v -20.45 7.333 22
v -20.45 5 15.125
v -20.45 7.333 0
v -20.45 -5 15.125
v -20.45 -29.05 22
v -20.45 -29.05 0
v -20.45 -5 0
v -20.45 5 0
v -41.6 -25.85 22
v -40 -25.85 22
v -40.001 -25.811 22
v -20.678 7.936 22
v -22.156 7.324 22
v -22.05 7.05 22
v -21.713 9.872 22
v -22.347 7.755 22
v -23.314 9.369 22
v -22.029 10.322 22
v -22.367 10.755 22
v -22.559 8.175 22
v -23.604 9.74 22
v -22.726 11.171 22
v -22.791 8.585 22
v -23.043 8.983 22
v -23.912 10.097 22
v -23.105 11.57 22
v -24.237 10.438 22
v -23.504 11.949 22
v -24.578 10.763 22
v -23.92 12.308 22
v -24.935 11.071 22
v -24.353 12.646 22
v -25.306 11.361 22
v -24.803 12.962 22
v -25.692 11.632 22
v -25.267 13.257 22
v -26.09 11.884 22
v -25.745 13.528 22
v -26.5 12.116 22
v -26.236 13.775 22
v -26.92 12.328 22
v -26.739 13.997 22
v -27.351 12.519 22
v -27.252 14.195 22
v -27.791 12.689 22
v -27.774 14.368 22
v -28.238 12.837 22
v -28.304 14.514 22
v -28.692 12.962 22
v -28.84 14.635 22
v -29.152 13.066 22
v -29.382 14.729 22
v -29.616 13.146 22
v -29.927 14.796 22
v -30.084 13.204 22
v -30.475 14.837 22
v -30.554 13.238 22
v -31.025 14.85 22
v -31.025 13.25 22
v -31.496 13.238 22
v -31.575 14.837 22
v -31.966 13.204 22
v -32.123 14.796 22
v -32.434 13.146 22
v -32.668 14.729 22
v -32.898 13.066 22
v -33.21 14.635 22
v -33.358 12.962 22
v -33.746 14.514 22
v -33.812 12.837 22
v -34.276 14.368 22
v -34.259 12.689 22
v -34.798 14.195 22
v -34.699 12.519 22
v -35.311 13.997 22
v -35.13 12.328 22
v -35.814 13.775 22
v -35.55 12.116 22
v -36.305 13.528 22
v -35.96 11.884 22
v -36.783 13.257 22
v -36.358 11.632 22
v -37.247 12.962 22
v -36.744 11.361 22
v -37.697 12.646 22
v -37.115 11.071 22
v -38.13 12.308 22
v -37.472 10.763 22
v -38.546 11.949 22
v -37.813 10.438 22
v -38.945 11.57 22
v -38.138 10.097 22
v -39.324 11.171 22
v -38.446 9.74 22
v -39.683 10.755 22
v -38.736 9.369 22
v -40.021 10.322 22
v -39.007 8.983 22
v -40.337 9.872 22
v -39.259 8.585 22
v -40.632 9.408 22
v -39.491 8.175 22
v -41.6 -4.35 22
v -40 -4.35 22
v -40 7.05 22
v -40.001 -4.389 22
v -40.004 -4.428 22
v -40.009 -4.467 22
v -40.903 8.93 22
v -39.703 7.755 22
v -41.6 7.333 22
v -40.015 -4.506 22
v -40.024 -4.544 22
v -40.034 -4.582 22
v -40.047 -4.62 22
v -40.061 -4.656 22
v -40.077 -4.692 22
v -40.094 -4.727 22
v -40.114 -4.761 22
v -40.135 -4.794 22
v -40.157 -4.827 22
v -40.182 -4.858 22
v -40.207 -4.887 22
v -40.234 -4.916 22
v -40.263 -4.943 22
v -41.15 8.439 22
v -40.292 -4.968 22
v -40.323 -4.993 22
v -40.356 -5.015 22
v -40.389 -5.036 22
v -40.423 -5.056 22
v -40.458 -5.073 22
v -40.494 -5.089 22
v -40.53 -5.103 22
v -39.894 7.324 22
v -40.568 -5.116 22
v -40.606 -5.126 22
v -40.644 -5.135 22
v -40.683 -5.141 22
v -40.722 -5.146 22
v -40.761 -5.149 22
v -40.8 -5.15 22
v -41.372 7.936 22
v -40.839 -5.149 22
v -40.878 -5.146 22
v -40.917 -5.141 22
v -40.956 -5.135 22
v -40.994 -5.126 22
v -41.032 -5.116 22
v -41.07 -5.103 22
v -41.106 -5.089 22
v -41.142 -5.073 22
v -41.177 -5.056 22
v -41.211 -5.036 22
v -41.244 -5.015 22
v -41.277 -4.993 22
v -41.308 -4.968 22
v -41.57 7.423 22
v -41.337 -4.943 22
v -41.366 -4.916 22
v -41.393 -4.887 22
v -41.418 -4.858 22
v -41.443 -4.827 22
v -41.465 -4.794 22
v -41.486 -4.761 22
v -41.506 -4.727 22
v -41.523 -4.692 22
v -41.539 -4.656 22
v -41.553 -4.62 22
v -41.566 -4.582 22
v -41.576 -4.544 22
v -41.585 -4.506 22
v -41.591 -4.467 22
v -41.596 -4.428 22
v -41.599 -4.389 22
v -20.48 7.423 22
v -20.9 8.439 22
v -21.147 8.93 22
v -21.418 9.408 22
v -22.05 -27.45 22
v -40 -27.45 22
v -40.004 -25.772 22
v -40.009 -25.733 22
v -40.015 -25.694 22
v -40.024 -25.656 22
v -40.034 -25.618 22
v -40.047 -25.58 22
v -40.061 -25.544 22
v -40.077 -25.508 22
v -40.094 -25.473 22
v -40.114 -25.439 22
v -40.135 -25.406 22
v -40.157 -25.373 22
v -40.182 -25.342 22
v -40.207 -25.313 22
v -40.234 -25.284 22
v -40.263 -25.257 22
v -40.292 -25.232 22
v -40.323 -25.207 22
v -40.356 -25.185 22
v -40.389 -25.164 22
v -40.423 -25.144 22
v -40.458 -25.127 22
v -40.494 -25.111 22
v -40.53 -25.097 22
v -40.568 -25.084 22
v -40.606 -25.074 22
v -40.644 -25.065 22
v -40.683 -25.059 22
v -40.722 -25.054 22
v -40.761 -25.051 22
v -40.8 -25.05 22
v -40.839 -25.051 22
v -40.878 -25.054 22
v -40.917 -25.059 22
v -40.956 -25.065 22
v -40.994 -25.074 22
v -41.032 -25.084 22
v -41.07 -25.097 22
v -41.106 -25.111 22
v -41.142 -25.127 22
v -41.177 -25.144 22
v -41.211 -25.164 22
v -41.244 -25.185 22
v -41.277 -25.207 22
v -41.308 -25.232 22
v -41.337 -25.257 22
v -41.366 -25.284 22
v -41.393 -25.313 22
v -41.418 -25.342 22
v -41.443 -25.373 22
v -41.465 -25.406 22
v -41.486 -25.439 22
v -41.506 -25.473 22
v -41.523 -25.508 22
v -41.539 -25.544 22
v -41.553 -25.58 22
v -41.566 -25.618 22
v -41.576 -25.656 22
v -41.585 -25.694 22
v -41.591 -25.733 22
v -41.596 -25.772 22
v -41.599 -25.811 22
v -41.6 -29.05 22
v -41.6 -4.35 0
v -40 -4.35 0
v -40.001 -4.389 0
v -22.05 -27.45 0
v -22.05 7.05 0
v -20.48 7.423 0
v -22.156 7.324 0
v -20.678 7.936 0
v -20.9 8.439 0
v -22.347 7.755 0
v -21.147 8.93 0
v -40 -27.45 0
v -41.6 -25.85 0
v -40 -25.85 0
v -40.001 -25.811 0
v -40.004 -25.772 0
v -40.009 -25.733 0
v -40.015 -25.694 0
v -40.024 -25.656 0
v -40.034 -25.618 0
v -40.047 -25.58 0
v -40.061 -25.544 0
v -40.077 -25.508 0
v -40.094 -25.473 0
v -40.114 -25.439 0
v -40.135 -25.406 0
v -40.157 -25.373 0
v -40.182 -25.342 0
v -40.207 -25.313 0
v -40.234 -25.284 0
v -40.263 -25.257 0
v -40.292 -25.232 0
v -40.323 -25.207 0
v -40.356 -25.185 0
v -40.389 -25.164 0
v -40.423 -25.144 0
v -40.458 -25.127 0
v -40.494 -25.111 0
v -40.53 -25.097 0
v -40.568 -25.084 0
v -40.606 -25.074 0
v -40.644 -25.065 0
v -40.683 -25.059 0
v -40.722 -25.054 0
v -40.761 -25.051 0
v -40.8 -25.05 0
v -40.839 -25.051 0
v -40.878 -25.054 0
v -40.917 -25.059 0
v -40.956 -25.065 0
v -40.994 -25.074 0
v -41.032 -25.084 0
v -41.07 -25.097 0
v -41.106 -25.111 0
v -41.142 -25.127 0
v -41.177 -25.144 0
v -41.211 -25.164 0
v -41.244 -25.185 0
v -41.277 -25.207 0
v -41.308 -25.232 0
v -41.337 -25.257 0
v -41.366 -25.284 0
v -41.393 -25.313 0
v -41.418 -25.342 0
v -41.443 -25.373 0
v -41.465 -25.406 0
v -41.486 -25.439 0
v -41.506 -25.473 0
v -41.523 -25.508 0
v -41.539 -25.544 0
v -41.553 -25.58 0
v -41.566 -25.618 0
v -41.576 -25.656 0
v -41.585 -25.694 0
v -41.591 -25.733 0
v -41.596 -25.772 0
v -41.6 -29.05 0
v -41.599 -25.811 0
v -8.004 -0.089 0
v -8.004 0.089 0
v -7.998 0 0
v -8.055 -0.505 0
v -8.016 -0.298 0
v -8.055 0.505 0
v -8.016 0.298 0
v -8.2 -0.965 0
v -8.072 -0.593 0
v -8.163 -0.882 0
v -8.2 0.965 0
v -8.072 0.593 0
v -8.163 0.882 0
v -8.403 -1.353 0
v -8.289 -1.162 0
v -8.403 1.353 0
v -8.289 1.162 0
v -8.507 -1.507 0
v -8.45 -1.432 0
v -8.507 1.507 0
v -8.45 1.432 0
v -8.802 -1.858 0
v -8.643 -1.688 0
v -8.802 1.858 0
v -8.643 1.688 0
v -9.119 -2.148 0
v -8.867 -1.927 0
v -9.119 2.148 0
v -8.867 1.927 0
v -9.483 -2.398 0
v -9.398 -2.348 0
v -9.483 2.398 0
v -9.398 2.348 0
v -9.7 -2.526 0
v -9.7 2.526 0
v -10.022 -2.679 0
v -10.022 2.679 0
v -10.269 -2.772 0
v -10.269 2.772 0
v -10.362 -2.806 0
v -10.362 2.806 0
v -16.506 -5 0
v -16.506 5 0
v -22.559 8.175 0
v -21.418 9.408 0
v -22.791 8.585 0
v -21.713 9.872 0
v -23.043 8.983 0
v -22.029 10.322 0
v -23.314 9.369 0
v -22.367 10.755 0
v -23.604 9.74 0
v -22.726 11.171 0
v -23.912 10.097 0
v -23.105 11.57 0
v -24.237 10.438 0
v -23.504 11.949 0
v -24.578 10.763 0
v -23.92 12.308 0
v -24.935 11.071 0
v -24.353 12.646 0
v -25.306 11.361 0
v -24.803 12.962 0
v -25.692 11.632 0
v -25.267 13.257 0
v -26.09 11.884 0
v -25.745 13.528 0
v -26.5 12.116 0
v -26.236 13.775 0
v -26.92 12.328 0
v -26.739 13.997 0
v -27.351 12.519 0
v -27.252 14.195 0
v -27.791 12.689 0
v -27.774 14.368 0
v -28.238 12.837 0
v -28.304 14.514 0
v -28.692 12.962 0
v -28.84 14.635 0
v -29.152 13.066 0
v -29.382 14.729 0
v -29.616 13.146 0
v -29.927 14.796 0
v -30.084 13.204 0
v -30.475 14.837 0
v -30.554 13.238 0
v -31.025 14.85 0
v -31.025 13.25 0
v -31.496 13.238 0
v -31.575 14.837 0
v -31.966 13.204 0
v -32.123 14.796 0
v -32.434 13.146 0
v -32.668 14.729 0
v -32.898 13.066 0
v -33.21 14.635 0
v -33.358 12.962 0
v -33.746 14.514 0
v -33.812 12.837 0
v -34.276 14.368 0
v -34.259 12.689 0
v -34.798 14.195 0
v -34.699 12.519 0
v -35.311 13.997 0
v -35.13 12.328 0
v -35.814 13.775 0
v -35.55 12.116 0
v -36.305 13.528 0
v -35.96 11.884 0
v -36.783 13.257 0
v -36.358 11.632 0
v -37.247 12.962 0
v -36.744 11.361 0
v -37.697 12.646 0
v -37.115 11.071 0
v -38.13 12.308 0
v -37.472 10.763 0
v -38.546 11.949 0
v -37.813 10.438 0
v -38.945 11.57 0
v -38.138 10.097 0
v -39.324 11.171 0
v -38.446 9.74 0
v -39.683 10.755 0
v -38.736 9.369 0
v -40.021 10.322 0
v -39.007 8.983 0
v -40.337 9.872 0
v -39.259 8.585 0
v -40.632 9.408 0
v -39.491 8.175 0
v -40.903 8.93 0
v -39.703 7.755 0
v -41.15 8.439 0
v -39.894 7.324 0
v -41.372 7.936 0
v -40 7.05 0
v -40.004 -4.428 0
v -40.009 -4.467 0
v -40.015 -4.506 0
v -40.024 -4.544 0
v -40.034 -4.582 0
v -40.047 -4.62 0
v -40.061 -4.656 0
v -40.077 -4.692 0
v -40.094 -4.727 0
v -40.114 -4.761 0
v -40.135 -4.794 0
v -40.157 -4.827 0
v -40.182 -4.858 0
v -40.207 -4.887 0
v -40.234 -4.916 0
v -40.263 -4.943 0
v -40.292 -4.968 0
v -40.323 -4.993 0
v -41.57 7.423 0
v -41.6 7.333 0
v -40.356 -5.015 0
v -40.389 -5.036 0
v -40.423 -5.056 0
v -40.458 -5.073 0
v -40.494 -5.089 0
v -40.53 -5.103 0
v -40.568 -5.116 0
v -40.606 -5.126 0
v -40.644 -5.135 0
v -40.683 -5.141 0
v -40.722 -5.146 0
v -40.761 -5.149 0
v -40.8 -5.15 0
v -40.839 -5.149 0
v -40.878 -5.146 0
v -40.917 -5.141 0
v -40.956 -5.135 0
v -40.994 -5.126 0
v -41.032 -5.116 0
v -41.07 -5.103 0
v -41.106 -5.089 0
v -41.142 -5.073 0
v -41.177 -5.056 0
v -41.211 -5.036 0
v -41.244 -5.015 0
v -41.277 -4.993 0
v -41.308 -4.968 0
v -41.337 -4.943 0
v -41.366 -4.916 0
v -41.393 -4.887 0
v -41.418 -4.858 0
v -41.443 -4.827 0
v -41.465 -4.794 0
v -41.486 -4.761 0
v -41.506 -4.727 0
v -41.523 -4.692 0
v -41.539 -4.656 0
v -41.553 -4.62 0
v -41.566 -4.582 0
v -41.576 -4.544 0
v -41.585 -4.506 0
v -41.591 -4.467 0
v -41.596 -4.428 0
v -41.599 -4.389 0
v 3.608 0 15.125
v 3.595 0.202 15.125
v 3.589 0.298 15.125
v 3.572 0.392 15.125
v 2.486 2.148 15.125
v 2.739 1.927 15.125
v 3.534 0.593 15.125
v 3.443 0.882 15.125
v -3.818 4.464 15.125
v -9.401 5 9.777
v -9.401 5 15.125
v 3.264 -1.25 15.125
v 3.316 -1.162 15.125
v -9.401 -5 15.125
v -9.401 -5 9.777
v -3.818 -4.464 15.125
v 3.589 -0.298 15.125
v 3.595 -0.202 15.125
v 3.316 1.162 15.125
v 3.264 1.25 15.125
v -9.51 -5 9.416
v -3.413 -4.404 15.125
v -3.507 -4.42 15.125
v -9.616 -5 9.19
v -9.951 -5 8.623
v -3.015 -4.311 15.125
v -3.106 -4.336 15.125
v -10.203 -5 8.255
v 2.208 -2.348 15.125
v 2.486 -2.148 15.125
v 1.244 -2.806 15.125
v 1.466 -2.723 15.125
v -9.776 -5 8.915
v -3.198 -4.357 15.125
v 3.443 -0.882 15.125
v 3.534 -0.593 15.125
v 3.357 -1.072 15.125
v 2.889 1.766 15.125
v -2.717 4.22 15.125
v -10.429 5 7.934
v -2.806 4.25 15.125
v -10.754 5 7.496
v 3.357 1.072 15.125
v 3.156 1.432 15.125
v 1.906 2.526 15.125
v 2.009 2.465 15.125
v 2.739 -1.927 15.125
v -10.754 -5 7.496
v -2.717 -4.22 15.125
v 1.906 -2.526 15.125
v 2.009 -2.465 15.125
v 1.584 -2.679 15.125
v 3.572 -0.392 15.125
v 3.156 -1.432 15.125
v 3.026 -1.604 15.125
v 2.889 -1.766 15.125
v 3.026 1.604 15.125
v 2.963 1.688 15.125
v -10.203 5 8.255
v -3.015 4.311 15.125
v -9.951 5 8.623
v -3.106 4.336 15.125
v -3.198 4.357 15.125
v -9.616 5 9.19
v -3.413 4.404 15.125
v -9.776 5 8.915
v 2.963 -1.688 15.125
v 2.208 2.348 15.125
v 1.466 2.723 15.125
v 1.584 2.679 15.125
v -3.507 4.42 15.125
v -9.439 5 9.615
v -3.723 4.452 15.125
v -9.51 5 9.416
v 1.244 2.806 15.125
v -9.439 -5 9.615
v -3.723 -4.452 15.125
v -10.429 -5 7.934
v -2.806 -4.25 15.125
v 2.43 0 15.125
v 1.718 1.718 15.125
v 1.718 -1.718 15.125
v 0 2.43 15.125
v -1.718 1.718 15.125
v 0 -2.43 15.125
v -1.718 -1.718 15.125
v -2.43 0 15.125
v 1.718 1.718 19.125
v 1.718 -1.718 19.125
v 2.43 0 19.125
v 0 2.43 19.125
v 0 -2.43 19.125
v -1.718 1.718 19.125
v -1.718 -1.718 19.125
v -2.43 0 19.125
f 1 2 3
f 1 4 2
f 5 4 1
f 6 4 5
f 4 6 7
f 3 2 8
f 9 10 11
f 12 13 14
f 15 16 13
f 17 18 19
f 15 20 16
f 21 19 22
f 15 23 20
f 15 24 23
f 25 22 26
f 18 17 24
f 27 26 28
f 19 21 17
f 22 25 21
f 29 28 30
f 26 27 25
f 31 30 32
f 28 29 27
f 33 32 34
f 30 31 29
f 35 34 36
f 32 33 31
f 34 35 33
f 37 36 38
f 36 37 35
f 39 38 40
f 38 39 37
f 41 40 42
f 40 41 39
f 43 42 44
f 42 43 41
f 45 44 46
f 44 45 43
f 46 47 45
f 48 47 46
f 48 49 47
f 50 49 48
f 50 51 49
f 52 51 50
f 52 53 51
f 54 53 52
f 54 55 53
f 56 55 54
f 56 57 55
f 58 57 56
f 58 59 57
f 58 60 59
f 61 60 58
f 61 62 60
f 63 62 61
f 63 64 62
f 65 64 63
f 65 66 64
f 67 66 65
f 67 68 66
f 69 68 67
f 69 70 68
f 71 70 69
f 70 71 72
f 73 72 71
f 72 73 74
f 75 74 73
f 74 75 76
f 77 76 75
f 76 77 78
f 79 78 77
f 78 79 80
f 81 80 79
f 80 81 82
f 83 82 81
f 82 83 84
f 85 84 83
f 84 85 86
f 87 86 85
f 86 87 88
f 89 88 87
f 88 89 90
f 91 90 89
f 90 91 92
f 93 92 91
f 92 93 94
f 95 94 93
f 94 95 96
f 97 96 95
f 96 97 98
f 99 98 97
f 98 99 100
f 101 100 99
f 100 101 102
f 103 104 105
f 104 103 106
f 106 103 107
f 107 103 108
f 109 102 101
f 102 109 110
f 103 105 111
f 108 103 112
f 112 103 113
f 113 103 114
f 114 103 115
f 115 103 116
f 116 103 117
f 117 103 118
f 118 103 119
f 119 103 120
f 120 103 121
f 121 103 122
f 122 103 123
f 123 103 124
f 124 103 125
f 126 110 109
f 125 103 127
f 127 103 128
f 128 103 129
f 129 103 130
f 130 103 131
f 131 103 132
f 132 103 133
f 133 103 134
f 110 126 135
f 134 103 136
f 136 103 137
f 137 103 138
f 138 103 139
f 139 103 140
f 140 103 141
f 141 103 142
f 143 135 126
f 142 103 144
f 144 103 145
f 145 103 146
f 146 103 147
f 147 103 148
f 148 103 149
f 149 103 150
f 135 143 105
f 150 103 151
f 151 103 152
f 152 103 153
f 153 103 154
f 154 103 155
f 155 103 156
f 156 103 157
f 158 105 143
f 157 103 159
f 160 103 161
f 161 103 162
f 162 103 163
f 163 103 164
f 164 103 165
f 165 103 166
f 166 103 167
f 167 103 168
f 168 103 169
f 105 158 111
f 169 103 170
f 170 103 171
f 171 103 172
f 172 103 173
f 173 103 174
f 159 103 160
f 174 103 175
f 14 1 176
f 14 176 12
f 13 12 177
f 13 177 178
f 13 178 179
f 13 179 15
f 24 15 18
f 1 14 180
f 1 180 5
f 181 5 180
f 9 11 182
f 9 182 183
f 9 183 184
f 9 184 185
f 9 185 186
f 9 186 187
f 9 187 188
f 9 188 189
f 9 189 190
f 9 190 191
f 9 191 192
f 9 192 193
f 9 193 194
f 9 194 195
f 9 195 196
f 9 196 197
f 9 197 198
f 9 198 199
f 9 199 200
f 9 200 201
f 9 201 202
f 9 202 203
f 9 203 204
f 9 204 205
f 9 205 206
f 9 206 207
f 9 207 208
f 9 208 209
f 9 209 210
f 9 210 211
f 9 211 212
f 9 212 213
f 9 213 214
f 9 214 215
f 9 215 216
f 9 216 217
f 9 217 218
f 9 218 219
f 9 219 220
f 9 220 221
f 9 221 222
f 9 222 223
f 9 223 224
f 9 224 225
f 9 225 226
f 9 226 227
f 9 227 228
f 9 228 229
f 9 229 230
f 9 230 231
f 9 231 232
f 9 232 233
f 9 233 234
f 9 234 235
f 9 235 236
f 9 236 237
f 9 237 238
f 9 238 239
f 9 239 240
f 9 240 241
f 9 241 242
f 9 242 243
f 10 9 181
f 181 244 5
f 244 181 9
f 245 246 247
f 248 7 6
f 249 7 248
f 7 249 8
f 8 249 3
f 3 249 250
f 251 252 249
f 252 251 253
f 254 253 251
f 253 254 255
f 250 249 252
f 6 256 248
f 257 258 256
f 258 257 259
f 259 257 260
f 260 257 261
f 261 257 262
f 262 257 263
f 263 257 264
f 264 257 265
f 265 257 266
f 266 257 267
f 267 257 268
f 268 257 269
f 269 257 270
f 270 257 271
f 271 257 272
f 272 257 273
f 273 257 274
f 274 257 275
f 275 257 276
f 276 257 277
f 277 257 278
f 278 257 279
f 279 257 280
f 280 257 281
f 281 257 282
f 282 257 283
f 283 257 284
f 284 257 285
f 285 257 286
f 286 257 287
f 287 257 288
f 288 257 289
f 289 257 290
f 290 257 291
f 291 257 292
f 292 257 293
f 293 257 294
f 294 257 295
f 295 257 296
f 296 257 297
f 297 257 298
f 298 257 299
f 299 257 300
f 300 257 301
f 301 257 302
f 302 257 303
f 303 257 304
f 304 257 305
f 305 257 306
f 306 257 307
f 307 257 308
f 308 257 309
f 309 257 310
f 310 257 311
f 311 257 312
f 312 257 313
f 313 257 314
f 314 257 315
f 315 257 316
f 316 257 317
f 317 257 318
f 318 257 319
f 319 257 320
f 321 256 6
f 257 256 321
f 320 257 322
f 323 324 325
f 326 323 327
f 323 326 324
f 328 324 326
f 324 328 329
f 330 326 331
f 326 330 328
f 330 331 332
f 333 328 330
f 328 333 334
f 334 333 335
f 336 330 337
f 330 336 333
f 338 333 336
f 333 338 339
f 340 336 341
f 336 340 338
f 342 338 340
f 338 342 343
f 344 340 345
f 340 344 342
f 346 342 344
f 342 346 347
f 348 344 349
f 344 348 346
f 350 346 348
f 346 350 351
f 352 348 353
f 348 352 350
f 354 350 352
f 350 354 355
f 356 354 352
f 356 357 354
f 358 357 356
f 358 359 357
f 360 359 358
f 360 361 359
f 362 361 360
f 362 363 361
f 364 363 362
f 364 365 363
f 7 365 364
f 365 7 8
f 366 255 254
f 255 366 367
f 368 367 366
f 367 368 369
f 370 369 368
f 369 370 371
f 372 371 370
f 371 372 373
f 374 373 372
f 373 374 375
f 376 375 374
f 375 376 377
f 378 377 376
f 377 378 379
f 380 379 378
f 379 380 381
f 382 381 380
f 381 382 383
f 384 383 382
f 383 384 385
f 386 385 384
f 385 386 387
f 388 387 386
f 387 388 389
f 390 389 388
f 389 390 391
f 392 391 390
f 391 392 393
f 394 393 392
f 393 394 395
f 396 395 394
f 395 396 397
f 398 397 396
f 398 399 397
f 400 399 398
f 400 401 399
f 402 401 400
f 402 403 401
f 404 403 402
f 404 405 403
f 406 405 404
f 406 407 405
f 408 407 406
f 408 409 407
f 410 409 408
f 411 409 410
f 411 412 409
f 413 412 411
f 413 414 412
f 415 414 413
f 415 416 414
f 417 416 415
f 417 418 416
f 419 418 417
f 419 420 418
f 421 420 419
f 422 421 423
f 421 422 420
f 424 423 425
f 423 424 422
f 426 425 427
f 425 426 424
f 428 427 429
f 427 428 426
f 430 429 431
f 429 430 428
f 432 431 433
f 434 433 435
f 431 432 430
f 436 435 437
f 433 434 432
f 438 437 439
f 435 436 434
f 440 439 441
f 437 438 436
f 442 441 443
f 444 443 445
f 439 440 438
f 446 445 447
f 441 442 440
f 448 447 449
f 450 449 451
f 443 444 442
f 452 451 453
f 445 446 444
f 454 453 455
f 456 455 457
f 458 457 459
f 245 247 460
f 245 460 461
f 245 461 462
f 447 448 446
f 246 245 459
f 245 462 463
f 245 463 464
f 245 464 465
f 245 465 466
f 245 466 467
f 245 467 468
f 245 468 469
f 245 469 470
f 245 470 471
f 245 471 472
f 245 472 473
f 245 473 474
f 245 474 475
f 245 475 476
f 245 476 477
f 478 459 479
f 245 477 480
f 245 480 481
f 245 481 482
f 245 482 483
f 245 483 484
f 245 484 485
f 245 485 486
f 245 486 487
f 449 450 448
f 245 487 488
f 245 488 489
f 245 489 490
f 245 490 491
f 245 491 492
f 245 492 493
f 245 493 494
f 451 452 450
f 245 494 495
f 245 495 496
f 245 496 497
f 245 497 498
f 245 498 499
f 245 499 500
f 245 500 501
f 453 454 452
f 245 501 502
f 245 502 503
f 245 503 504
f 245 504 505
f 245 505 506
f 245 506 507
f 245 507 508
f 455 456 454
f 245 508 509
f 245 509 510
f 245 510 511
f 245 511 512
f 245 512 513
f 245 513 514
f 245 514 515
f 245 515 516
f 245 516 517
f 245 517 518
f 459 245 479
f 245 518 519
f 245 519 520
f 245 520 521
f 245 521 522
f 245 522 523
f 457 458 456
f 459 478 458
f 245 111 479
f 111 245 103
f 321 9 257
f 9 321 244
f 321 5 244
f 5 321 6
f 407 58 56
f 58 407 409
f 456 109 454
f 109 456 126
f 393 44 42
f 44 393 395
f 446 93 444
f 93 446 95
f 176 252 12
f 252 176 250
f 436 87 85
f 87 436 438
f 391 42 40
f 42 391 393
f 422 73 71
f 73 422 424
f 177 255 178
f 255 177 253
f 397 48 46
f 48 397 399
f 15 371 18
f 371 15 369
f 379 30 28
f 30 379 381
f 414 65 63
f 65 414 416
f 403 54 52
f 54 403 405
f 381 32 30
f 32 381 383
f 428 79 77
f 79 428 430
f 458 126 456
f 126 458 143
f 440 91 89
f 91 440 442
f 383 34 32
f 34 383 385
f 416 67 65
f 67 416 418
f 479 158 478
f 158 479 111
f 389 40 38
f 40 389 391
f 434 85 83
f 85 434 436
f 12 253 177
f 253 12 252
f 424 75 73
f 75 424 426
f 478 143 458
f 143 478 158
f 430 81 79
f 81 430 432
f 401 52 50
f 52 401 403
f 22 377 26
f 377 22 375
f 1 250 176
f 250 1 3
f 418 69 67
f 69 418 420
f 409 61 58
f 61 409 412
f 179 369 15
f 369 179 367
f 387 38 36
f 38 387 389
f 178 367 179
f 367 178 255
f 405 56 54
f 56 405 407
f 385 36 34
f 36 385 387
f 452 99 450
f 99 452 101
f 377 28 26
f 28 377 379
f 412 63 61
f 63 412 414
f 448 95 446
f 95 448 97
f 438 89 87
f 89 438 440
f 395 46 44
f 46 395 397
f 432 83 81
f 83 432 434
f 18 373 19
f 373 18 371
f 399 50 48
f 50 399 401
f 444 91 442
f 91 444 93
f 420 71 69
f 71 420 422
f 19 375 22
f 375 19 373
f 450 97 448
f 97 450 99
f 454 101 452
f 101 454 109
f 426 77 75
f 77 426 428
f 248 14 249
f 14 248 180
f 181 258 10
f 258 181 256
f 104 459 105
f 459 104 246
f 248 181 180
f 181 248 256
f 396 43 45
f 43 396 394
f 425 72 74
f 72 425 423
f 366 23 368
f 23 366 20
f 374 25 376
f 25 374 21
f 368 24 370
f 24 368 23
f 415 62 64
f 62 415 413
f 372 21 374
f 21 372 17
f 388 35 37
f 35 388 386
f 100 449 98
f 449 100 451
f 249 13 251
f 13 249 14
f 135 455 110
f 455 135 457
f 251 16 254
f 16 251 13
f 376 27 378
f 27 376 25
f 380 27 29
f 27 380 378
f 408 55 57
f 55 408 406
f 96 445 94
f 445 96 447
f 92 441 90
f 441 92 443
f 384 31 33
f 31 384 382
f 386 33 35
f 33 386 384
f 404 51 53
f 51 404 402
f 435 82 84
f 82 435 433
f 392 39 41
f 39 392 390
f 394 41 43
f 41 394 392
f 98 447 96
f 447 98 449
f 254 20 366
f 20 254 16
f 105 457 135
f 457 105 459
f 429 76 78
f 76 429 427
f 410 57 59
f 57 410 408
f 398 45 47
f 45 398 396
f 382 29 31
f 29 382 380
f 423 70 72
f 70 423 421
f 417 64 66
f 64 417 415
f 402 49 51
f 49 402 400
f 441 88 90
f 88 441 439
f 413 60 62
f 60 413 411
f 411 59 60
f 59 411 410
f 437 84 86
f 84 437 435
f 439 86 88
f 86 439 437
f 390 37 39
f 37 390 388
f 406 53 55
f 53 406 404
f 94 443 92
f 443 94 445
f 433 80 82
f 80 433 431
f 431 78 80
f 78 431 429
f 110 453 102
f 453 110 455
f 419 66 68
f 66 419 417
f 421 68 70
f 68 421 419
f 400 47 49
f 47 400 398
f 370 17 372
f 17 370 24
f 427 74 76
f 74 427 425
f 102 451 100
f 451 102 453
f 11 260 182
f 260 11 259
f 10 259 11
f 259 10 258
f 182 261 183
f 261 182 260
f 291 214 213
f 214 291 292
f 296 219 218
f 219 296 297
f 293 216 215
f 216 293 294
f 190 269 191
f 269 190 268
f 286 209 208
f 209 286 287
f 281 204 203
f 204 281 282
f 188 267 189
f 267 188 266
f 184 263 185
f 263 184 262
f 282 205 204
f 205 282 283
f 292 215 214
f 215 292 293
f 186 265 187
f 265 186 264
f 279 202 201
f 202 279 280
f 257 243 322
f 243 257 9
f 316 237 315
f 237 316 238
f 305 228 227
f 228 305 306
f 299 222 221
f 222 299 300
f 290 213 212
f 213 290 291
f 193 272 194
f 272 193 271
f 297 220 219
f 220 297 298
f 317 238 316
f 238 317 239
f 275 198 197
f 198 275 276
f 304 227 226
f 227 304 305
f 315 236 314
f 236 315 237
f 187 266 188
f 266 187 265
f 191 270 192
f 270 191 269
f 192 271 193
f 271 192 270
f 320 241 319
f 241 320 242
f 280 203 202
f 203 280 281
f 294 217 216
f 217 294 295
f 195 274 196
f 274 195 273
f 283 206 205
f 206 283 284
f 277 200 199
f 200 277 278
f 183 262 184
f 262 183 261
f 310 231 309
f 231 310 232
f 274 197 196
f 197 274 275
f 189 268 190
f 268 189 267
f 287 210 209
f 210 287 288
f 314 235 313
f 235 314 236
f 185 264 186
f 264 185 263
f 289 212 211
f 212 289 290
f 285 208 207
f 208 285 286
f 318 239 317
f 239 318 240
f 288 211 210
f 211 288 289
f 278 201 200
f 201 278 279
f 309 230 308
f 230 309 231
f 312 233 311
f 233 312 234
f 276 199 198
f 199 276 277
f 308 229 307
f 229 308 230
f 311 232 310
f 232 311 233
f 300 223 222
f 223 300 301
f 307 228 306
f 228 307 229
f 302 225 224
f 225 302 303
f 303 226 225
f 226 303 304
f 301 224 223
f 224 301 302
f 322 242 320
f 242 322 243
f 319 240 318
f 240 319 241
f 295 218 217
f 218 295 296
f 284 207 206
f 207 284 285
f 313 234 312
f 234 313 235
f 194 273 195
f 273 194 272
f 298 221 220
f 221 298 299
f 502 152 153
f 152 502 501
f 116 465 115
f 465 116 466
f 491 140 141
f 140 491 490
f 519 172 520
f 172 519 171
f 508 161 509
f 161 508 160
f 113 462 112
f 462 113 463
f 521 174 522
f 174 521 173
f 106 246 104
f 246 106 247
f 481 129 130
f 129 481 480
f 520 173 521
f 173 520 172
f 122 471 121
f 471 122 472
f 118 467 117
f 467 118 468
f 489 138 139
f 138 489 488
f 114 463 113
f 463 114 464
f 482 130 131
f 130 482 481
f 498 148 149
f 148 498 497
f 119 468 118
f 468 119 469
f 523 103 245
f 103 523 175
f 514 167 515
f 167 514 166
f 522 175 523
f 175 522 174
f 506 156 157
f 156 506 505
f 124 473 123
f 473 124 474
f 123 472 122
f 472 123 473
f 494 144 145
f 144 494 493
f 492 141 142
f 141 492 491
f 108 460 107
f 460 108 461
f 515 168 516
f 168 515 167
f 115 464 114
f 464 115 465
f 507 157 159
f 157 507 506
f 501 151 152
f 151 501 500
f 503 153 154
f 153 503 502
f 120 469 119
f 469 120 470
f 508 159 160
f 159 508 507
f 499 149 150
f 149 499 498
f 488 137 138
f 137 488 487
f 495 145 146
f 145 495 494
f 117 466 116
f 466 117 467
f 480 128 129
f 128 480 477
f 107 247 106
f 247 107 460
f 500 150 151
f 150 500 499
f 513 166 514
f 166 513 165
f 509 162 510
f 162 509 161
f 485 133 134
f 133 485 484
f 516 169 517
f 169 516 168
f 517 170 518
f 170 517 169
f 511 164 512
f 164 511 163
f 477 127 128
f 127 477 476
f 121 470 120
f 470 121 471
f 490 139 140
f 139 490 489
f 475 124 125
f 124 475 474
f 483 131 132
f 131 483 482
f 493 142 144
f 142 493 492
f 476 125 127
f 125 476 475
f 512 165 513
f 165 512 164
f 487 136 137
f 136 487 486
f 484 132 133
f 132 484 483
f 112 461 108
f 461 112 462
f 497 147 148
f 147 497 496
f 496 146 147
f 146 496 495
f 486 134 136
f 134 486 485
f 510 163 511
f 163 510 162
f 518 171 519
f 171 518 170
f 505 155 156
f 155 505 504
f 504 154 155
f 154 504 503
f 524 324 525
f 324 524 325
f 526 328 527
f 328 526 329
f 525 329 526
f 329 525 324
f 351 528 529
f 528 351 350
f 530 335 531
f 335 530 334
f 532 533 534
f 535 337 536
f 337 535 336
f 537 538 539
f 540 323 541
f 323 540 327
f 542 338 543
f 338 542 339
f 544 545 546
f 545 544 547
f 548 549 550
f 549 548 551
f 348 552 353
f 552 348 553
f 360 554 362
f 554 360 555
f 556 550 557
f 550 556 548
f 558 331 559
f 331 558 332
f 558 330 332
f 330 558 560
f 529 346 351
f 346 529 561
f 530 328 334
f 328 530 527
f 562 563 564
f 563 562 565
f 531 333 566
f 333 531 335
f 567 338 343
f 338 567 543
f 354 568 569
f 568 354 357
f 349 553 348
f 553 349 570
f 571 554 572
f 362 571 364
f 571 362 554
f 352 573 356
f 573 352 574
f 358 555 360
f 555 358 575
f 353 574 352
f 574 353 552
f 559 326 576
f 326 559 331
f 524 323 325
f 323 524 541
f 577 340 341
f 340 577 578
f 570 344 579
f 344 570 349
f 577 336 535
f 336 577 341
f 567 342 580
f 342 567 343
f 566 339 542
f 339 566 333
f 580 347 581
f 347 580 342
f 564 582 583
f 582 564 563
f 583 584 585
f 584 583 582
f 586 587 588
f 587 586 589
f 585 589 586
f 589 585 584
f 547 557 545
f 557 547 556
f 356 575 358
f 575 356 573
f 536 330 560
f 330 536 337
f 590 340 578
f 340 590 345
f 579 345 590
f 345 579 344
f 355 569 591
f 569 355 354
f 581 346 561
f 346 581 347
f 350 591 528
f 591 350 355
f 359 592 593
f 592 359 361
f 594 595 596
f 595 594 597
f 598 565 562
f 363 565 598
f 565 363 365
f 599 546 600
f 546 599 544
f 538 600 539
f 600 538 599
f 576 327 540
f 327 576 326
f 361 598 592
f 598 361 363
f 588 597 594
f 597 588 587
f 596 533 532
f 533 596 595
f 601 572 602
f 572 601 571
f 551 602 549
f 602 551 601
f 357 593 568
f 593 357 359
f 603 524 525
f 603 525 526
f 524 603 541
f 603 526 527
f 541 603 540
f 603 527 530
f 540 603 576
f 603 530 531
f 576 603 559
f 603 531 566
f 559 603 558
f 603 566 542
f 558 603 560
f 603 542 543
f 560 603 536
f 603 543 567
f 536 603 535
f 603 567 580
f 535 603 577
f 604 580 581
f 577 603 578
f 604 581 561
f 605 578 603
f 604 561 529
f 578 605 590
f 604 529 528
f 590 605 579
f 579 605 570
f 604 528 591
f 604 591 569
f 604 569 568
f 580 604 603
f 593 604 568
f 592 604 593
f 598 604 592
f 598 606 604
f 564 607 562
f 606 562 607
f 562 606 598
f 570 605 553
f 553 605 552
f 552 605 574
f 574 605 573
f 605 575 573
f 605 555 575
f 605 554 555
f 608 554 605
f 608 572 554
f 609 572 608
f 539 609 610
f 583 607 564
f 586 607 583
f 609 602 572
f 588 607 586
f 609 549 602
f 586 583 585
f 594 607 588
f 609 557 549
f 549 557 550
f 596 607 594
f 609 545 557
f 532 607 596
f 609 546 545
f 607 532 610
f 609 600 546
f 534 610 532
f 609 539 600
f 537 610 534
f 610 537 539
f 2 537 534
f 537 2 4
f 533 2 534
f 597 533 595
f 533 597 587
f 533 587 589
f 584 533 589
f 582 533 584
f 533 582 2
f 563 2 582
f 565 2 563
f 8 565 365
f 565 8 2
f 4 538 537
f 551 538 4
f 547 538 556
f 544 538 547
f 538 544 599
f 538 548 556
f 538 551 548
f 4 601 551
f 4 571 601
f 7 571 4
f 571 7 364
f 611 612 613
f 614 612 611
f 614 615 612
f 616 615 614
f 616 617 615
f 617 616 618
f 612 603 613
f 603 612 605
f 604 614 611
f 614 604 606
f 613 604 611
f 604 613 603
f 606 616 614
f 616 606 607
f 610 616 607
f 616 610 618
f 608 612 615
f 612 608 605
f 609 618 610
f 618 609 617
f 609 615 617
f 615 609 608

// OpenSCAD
$fn = $preview ? 8 : 128;

// dimensions for bracket
buffer = 0.2;
stiffness = 1.6;
bracket_height = 22;

// approximate
ecobee_sensor_width = 40;
ecobee_sensor_height = 40;
ecobee_sensor_depth = 26.5;

// beam width is consistent
beam_width = 17.75 + buffer;

// horizontal beam
hbeam_height = 40 + buffer;
hbeam_width = beam_width;

// vertical beam
vbeam_depth = 40.5 + buffer;
vbeam_front_rad = 9.5 + (buffer/2);
vbeam_width = beam_width;

// bracket
brace_left_width = stiffness;
brace_left_depth = (vbeam_depth - vbeam_front_rad) + (buffer * 2);
brace_left_height = bracket_height;

brace_rear_width = vbeam_width + (buffer * 2);
brace_rear_depth = stiffness;
brace_rear_height = bracket_height;

brace_front_rad = vbeam_front_rad + (buffer * 2);
brace_front_height = bracket_height;

bracket_gap = (vbeam_depth - vbeam_front_rad) - (stiffness * 6);


module shelf() {
    translate([0, -100, 0]) cube([hbeam_width, 100, hbeam_height]);
    intersection() {
        cube([vbeam_width, vbeam_depth, 100], center=false);
        union() {
            cube([vbeam_width, vbeam_depth - vbeam_width/2, 100], center=false);
            translate([vbeam_width/2, vbeam_depth - vbeam_front_rad, 0]) cylinder(r=vbeam_front_rad, h=100);
        }
    }
}

module ecobee_and_shelf() {
    if ($preview) {
        color("silver") translate([-ecobee_sensor_width/2, -ecobee_sensor_depth/2, 16]) cube([ecobee_sensor_width, ecobee_sensor_depth,  ecobee_sensor_height]);
        color("grey") translate([-ecobee_sensor_width, -(vbeam_depth - ecobee_sensor_depth/2), -hbeam_height]) shelf();
    }
}

module vbeam_bracket() {
    union() {
        difference() {
            intersection() {
                translate([0, -stiffness, 0]) cube([vbeam_width + (stiffness * 2), vbeam_depth + (stiffness * 2), bracket_height]);
                union() {
                    translate([0, -stiffness, 0]) cube([vbeam_width + (stiffness * 2), vbeam_depth - vbeam_width/2, bracket_height]);
                    translate([(vbeam_width + stiffness * 2)/2, vbeam_depth - (vbeam_front_rad), 0]) cylinder(r=(vbeam_front_rad + stiffness), h=bracket_height);
                }
            }
            translate([stiffness, 0, -hbeam_height]) shelf();
            translate([-buffer/2, stiffness * 1, -buffer/2]) cube([stiffness + buffer, bracket_gap, bracket_height + buffer]);
        }
        translate([stiffness / 2, stiffness * 1, 0]) cylinder(r=stiffness / 2, h=bracket_height);
        translate([stiffness / 2, bracket_gap + stiffness * 1, 0]) cylinder(r=stiffness / 2, h=bracket_height);
    }

    // cube([brace_left_width, brace_left_depth, brace_left_height]);
    // translate([-brace_rear_width, 0, 0]) cube([brace_rear_width, brace_rear_depth, brace_rear_height]);
    // translate([-(brace_front_rad - stiffness), brace_left_depth, 0]) difference() {
    //     cylinder(r=brace_front_rad, h=brace_front_height, center=false);
    //     translate([0, 0, -0.1]) cylinder(r=(brace_front_rad - stiffness), h=brace_front_height + buffer, center=false);
    //     translate([-(brace_front_rad + buffer), -(brace_front_rad + buffer), -0.1]) cube([brace_rear_width + stiffness * 2, brace_front_rad + buffer, brace_front_height + buffer]);
    // }
    // difference() { 
    //     #translate([-(brace_front_rad * 2 - stiffness), 0, 0]) cube([brace_left_width, brace_left_depth, brace_left_height]);
    //     translate([-(brace_front_rad * 2 - stiffness) - 0.1, stiffness * 3, -0.1]) cube([brace_left_width + buffer, brace_left_depth - stiffness * 4, brace_left_height + buffer]);
    // }
}

module ecobee_stand() {
    translate([0, 0, (bracket_height * 11/16)]) cylinder(r=2.43, h = 4, $fn=8);
    intersection() {
        hull() {
            translate([-19.5, 0, -10]) rotate([0, 37.50, 0]) cylinder(r1=2.43 * 1.25, r2=2.43 * 1.25, h=50, $fn = 64);
            translate([-ecobee_sensor_width/2, 2, 0]) cylinder(r=4, h=bracket_height * 11/16);
            translate([-ecobee_sensor_width/2, -2, 0]) cylinder(r=4, h=bracket_height * 11/16);
        }
        #translate([-21.0, -5, 0]) cube([ecobee_sensor_width / 2 + 5, 10, bracket_height * 11/16]);
    }
    //cube([2.43 * 2, 2.43 * 2, 2.43 * 2], center=true);
}

ecobee_and_shelf();
intersection() {
    union() {
        translate([-(ecobee_sensor_width + stiffness), -(vbeam_depth - ecobee_sensor_depth/2), 0]) vbeam_bracket();
        ecobee_stand();
    }
    // translate([-200, -200, bracket_height * 5/8]) cube([400, 400, bracket_height / 4], center=false);
}

//import("Ecobee_SmartSensor_Stand.stl");
